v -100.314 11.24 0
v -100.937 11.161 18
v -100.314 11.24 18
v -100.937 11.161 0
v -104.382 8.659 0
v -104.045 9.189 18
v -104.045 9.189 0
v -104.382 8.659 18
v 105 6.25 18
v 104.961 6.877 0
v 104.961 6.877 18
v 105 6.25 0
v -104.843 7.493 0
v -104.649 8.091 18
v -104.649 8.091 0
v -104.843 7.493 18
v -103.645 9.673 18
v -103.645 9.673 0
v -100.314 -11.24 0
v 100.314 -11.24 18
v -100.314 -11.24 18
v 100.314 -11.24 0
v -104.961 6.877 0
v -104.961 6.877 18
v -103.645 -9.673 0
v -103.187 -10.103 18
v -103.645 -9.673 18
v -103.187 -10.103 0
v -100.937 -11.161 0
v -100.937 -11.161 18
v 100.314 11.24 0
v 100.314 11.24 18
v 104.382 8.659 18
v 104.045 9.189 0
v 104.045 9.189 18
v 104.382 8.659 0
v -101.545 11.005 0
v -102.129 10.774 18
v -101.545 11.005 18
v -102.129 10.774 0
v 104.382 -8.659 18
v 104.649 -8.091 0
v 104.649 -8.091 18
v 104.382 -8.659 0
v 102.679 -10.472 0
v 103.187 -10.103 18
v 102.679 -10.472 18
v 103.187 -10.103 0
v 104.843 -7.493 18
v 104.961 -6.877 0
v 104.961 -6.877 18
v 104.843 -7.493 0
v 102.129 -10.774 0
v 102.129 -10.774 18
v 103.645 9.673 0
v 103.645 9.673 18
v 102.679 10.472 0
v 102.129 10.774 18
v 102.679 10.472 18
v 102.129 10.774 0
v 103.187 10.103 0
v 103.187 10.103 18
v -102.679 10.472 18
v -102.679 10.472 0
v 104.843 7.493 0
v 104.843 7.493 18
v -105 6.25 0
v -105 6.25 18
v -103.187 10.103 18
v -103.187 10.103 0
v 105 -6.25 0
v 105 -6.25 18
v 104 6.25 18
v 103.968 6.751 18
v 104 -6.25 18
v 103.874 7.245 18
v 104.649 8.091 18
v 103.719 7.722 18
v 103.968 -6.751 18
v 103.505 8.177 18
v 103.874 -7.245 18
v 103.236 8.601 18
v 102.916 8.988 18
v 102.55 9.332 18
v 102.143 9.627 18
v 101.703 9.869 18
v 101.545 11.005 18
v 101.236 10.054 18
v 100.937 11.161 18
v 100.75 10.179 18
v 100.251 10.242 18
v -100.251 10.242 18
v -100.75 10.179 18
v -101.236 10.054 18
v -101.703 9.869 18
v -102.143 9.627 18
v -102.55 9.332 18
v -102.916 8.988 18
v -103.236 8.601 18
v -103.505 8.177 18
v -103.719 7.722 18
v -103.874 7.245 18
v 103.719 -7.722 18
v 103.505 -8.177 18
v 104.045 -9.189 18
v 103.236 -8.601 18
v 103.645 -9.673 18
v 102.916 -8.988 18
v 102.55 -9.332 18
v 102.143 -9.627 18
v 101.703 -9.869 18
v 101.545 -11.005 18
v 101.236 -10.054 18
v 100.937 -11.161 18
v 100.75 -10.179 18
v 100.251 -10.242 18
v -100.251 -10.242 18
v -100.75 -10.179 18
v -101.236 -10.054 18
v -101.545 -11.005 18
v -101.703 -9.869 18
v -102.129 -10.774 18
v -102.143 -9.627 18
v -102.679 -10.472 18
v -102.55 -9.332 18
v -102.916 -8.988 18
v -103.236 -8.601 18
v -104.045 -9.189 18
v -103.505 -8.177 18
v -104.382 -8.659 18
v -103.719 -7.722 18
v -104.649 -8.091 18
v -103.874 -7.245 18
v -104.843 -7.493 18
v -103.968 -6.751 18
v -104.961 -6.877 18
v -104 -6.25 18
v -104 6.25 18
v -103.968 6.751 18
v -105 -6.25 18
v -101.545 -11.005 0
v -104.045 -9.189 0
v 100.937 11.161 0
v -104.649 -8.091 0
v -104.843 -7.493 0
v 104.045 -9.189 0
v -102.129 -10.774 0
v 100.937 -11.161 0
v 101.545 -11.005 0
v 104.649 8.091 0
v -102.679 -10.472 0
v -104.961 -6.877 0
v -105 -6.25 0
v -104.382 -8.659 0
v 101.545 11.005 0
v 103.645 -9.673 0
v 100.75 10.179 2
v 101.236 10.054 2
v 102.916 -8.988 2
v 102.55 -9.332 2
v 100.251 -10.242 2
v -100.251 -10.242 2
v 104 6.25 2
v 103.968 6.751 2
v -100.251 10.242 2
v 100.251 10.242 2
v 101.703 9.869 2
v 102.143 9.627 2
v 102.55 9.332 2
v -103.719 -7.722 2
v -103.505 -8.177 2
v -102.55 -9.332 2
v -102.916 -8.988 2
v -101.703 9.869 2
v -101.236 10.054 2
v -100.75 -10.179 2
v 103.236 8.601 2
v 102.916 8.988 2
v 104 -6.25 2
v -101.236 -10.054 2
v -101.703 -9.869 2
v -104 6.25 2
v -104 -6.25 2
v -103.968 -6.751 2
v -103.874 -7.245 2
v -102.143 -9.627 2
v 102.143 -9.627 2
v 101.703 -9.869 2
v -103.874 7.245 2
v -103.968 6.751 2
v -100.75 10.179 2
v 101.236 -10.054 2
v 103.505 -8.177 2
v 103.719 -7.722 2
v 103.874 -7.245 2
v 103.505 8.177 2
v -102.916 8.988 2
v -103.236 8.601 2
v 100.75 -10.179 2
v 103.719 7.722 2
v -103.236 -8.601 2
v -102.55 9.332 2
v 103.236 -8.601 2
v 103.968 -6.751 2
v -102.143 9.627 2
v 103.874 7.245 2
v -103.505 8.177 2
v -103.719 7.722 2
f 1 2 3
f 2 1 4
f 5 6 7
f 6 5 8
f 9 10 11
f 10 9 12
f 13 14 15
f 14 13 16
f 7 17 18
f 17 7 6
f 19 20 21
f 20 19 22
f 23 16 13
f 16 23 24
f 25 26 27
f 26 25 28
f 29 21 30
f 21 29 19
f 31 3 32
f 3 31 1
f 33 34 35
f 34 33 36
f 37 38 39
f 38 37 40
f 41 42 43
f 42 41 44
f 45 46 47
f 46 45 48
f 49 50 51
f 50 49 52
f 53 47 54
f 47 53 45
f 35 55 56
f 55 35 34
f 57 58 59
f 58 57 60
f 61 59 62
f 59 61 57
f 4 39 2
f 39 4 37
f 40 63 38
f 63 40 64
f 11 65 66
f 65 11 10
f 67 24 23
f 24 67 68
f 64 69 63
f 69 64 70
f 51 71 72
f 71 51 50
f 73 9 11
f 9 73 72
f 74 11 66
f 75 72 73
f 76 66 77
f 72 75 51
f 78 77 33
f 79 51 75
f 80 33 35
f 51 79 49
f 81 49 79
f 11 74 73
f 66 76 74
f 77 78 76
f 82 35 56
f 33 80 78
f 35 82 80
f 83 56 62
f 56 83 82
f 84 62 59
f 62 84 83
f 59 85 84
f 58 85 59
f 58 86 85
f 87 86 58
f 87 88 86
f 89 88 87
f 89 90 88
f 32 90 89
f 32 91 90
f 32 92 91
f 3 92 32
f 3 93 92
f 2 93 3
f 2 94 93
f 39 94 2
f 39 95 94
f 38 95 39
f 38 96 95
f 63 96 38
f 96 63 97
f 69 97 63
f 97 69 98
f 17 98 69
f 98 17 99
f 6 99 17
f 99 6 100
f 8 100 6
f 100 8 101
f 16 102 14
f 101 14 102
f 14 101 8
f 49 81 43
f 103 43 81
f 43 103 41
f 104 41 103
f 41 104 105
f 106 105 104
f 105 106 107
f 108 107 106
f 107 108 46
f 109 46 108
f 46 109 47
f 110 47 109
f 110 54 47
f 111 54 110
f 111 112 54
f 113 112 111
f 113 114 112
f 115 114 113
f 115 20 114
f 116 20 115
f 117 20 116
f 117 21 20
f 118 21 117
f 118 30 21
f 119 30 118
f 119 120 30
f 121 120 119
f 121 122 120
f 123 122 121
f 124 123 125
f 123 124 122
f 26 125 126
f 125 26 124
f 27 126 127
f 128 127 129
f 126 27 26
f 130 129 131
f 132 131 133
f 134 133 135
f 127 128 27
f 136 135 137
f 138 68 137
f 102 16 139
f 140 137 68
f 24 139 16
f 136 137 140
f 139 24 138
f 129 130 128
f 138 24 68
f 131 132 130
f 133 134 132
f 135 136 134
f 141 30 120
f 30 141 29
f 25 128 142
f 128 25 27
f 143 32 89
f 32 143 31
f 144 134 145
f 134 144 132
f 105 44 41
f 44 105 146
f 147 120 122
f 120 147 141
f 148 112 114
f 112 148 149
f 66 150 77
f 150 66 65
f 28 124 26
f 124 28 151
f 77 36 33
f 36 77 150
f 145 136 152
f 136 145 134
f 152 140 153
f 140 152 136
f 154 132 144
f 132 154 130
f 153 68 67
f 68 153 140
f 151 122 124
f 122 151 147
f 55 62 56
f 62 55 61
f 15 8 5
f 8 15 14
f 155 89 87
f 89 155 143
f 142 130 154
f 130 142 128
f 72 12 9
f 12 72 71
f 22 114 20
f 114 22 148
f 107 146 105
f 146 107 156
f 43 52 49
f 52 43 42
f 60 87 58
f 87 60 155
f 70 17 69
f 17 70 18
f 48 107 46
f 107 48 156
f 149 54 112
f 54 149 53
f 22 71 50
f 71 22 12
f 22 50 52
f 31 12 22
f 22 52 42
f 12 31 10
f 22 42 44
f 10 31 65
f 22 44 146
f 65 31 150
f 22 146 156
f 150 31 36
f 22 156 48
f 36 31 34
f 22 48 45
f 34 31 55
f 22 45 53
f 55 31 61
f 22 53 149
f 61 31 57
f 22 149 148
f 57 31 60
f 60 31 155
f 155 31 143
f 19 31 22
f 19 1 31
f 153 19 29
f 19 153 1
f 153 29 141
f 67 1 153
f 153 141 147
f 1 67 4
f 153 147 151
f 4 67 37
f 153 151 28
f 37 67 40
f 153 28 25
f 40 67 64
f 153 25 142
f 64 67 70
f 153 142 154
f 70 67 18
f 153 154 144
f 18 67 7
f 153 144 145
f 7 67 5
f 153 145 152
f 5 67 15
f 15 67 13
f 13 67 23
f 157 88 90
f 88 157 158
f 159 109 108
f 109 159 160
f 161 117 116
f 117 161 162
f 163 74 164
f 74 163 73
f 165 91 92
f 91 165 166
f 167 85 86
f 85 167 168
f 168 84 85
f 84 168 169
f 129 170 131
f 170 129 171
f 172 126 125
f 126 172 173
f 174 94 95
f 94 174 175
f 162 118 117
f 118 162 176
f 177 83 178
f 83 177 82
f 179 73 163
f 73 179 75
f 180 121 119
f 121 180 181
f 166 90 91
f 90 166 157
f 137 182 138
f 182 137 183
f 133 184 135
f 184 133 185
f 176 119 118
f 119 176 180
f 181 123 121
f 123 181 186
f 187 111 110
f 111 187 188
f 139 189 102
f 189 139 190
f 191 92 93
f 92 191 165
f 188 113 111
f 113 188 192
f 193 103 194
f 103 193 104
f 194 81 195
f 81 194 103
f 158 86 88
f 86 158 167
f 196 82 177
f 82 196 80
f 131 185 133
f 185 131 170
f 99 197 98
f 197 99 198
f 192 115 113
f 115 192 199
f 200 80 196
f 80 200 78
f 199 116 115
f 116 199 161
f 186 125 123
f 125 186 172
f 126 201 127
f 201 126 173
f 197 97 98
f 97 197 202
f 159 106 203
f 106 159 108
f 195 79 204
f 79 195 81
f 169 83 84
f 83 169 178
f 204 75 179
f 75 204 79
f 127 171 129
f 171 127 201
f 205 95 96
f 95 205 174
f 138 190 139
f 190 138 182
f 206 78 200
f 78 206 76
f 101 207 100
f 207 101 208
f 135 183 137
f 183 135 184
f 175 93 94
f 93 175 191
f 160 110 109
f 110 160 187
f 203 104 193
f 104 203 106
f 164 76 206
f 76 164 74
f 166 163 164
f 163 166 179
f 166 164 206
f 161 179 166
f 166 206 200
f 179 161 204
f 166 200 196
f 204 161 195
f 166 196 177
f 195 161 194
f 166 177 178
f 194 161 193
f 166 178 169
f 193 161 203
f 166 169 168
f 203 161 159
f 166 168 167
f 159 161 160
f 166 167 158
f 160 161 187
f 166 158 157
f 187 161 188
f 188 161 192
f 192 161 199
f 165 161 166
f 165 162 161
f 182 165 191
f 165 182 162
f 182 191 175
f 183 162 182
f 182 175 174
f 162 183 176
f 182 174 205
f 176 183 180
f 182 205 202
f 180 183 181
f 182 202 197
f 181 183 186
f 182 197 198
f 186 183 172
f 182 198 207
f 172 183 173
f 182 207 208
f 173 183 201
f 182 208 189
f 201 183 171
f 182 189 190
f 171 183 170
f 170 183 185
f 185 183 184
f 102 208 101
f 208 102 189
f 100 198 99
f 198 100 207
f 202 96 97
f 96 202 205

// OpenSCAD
$fn = 50;


difference() {
	union() {
		hull() {
			translate(v = [-100.0000000000, 6.2500000000, 0]) {
				cylinder(h = 18, r = 5);
			}
			translate(v = [100.0000000000, 6.2500000000, 0]) {
				cylinder(h = 18, r = 5);
			}
			translate(v = [-100.0000000000, -6.2500000000, 0]) {
				cylinder(h = 18, r = 5);
			}
			translate(v = [100.0000000000, -6.2500000000, 0]) {
				cylinder(h = 18, r = 5);
			}
		}
	}
	union() {
		translate(v = [0, 0, 2]) {
			hull() {
				translate(v = [-100.0000000000, 6.2500000000, 0]) {
					cylinder(h = 16, r = 4);
				}
				translate(v = [100.0000000000, 6.2500000000, 0]) {
					cylinder(h = 16, r = 4);
				}
				translate(v = [-100.0000000000, -6.2500000000, 0]) {
					cylinder(h = 16, r = 4);
				}
				translate(v = [100.0000000000, -6.2500000000, 0]) {
					cylinder(h = 16, r = 4);
				}
			}
		}
	}
}
